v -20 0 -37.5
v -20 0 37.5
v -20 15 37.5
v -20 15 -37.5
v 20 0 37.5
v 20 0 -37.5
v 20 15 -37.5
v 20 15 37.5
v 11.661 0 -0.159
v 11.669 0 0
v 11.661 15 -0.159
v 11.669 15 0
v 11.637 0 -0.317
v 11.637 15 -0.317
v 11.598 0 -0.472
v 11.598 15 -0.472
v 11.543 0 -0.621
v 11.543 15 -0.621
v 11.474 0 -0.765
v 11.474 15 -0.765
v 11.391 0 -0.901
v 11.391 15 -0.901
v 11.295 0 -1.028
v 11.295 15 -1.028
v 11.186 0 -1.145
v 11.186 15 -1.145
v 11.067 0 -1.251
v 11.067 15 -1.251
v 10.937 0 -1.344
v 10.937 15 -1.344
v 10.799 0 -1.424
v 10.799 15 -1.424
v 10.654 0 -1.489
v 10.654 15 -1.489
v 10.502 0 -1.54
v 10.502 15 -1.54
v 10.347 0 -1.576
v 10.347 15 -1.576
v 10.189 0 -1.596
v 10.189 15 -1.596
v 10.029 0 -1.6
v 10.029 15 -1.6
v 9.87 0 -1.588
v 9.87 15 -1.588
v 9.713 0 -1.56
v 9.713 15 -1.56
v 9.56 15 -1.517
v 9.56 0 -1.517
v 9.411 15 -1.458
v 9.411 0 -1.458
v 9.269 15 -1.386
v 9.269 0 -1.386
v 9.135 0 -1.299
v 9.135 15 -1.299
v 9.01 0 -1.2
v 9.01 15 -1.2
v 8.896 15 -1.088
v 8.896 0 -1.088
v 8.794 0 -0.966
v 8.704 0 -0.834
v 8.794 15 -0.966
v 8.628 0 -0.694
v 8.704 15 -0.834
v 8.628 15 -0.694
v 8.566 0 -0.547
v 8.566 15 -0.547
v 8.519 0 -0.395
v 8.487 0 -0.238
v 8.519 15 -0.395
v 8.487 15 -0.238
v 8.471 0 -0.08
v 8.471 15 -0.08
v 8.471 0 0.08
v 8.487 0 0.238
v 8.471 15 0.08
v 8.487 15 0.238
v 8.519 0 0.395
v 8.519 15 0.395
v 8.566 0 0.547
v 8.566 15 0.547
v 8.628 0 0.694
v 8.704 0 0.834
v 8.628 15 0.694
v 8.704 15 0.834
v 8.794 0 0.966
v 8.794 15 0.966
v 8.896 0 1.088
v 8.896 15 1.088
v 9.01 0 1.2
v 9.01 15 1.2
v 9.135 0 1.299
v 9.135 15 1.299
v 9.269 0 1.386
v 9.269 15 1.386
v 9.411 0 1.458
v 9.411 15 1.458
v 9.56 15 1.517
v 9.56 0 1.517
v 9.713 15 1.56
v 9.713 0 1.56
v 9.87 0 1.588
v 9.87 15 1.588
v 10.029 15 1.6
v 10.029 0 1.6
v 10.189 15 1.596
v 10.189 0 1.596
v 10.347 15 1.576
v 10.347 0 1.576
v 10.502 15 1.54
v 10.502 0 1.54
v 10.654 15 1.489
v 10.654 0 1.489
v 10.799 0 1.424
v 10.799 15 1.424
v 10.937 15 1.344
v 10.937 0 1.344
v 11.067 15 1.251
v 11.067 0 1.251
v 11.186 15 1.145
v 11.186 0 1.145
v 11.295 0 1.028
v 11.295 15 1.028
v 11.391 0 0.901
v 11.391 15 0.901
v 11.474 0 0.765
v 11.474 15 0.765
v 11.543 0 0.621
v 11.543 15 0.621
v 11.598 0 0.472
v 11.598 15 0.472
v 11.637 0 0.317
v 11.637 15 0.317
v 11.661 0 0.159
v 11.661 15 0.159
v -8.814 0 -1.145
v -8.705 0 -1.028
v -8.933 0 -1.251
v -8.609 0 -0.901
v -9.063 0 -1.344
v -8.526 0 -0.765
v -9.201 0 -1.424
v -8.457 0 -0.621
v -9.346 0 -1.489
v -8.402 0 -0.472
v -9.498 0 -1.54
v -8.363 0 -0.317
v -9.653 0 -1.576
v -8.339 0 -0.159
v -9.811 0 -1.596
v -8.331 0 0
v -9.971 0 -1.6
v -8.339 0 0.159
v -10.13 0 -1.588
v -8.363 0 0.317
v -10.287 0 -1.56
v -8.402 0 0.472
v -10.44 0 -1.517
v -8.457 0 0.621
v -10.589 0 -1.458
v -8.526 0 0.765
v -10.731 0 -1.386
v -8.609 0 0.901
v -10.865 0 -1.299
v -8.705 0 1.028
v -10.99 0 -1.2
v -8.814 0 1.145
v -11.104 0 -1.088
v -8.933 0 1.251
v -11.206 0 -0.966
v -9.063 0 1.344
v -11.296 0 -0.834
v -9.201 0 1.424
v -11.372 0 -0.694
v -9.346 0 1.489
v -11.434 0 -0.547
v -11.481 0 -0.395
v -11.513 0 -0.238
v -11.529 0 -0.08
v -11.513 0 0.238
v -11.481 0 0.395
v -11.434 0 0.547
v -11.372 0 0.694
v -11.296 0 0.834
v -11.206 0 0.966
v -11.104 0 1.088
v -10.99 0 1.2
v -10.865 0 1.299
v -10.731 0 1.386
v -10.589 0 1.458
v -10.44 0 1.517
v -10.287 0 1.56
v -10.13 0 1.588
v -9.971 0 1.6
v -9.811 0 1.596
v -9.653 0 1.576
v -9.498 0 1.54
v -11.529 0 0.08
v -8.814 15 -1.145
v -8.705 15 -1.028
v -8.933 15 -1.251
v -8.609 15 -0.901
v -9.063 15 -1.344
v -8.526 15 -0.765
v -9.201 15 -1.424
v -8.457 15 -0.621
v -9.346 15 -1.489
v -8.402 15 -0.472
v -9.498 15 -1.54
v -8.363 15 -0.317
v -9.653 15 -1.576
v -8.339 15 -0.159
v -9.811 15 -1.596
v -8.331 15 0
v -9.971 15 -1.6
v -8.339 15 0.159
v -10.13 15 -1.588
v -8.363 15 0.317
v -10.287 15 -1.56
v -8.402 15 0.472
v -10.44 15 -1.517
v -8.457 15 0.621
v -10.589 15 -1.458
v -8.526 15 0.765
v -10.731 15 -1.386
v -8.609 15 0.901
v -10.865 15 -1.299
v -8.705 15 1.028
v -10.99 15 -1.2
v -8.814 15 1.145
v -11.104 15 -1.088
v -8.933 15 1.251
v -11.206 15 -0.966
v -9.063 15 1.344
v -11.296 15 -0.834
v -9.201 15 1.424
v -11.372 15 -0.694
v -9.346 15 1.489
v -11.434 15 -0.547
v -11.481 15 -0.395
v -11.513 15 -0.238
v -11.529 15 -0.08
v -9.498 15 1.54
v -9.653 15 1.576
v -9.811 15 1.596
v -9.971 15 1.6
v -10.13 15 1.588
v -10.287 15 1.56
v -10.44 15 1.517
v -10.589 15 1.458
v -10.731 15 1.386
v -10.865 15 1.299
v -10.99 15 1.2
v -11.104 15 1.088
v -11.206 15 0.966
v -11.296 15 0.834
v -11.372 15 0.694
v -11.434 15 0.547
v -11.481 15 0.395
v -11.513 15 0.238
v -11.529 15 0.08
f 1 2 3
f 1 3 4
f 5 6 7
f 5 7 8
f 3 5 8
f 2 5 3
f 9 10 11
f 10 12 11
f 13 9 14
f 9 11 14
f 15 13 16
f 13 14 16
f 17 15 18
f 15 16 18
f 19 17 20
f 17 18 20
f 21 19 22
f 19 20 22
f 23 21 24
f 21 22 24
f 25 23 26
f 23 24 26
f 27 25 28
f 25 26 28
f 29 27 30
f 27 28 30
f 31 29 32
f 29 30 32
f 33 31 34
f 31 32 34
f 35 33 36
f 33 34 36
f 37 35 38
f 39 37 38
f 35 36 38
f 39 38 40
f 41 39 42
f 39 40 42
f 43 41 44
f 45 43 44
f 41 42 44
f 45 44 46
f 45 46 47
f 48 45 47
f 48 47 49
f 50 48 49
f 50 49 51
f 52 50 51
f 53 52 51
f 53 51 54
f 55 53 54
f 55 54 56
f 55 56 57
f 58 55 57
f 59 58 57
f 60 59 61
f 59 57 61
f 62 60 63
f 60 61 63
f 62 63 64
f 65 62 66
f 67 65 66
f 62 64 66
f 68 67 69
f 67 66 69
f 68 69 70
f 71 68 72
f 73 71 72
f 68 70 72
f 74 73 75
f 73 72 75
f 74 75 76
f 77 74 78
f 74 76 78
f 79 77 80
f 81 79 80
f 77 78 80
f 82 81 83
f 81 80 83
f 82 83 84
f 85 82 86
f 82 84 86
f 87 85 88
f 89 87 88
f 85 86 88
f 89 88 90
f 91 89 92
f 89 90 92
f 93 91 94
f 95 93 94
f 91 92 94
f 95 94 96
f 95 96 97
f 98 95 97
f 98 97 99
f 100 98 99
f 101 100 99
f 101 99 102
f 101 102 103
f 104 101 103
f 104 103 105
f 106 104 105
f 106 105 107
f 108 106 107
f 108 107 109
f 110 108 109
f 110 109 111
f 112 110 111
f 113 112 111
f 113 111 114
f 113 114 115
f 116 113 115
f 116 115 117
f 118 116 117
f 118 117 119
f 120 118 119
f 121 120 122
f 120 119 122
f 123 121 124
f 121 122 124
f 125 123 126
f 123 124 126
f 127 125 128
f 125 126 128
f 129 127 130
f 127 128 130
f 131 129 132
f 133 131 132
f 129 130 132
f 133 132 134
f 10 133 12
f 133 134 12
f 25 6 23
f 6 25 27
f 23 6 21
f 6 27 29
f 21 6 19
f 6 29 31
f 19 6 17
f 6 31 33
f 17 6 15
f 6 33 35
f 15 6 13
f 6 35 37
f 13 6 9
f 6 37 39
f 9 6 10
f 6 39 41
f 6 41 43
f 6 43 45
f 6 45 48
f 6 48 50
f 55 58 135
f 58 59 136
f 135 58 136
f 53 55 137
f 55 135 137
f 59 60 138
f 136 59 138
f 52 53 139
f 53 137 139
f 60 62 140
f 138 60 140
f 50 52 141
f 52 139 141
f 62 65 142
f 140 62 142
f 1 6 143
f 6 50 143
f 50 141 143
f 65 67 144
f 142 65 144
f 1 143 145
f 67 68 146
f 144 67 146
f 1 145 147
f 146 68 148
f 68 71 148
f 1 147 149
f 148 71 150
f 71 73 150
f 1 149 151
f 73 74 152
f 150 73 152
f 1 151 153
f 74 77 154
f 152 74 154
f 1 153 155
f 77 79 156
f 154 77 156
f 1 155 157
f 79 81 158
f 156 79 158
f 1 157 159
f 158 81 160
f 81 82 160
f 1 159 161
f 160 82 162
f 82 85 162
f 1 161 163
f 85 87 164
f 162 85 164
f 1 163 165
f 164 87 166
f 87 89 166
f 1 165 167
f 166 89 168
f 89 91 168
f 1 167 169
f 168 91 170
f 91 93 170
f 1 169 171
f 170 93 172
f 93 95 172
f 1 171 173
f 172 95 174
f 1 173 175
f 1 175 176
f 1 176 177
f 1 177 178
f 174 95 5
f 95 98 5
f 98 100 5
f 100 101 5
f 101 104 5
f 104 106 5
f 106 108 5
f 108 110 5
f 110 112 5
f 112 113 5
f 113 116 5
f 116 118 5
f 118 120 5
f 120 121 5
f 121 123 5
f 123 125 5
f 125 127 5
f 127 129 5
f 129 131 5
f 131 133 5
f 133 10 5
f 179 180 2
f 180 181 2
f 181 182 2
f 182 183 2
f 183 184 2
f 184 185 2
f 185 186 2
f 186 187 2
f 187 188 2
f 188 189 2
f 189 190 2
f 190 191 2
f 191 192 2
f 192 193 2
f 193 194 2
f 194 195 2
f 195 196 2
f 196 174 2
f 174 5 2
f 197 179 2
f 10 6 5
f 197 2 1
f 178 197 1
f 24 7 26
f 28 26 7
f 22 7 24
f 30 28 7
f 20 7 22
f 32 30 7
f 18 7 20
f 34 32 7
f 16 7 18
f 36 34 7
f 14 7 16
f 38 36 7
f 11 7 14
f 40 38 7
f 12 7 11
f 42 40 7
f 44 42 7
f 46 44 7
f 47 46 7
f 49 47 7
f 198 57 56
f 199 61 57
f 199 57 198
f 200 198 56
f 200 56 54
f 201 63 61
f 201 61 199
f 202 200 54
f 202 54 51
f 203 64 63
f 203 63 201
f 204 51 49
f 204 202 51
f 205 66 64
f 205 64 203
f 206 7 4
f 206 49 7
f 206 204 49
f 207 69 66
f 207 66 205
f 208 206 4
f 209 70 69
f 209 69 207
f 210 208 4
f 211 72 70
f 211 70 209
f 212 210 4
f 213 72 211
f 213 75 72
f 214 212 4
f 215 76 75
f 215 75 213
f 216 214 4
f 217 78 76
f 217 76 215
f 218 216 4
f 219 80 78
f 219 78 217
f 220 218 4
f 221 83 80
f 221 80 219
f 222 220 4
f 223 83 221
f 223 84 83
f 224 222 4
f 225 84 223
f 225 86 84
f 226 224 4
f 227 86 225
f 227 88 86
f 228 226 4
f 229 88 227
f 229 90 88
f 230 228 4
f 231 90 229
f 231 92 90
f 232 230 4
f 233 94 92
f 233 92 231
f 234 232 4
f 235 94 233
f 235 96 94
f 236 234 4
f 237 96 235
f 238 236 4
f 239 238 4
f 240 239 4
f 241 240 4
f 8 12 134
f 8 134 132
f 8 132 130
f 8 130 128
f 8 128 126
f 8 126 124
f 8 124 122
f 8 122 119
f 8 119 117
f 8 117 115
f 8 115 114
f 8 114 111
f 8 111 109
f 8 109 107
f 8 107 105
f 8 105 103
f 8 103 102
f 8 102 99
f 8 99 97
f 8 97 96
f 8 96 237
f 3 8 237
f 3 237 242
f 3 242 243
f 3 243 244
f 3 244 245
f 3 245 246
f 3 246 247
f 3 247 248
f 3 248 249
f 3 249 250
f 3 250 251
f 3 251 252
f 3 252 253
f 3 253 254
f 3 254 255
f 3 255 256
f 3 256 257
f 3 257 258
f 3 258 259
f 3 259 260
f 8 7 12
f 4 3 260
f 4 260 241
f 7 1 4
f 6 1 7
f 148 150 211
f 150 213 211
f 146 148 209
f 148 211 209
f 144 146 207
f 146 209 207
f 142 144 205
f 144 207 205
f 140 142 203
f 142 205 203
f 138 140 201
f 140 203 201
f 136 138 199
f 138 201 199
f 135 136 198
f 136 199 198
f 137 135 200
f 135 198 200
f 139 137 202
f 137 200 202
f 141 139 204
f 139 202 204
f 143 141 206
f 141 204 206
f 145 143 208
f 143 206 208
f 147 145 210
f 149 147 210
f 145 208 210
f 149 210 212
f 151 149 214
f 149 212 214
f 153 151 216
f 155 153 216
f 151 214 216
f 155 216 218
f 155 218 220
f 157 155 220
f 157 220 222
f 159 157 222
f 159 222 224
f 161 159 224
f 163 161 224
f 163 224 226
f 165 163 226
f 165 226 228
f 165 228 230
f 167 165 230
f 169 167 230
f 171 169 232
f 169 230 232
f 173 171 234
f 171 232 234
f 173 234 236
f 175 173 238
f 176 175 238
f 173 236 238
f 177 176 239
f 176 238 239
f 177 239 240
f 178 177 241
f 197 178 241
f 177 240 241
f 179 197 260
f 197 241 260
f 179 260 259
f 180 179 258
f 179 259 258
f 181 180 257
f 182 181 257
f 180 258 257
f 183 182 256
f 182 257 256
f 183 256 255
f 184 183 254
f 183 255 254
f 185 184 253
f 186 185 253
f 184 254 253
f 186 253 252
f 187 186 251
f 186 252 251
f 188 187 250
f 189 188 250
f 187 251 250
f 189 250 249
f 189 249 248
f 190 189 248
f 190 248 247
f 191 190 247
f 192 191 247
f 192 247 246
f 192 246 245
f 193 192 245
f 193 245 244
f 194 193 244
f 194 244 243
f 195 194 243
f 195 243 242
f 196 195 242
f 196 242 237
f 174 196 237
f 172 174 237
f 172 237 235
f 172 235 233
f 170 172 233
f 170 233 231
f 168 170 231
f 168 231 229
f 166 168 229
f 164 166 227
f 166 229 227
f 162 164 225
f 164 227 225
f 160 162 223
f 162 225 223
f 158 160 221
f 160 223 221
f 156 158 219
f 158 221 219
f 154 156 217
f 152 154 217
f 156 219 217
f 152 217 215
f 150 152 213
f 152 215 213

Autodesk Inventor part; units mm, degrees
ref_plane "YZ Plane" through (0, 0, 0) normal (1, 0, 0) x (0, 1, 0)
ref_plane "XZ Plane" through (0, 0, 0) normal (0, 1, 0) x (-1, 0, 0)
ref_plane "XY Plane" through (0, 0, 0) normal (0, 0, 1) x (1, 0, 0)
sketch "Эскиз1" plane through (0, 0, 0) normal (0, 1, 0) x (-1, 0, 0)
  line L0 (-20, 37.5) -> (20, 37.5)
  line L1 (20, 37.5) -> (20, -37.5)
  line L2 (20, -37.5) -> (-20, -37.5)
  line L3 (-20, -37.5) -> (-20, 37.5)
  line L4 (-20, 37.5) -> (20, -37.5) construction
  line L5 (20, 37.5) -> (-20, -37.5) construction
  point P0 (0, 0)
  dimension "d0" = 75
  dimension "d1" = 40
extrude "Выдавливание1" add sketch "Эскиз1" along normal blind 15
sketch "Эскиз2" plane through (0, 15, 0) normal (0, 1, 0) x (1, 0, 0)
  circle A0 centre (10.0691, 0) radius 1.6
  circle A1 centre (-9.9309, 0) radius 1.6
  line L0 (-9.9309, 0) -> (10.0691, 0)
  line L1 (20, 37.5) -> (-20, 37.5) projected
  line L2 (0, 37.5) -> (0, -37.5)
  line L3 (-20, -37.5) -> (20, -37.5) projected
  line L4 (-20, 37.5) -> (-20, -37.5) projected
  line L5 (-20, 0) -> (20.2069, 0)
  point P0 (0, 0)
  point P1 (0.0691, 0)
  dimension "d4" = 3.2
  dimension "d5" = 3.2
  dimension "d6" = 20
extrude "Выдавливание2" cut sketch "Эскиз2" against normal blind 15 contours L5 L0 A0 | A0 L0 L5 | L0 L5 A1 | A1 L5 L0
properties part number "холдер"
